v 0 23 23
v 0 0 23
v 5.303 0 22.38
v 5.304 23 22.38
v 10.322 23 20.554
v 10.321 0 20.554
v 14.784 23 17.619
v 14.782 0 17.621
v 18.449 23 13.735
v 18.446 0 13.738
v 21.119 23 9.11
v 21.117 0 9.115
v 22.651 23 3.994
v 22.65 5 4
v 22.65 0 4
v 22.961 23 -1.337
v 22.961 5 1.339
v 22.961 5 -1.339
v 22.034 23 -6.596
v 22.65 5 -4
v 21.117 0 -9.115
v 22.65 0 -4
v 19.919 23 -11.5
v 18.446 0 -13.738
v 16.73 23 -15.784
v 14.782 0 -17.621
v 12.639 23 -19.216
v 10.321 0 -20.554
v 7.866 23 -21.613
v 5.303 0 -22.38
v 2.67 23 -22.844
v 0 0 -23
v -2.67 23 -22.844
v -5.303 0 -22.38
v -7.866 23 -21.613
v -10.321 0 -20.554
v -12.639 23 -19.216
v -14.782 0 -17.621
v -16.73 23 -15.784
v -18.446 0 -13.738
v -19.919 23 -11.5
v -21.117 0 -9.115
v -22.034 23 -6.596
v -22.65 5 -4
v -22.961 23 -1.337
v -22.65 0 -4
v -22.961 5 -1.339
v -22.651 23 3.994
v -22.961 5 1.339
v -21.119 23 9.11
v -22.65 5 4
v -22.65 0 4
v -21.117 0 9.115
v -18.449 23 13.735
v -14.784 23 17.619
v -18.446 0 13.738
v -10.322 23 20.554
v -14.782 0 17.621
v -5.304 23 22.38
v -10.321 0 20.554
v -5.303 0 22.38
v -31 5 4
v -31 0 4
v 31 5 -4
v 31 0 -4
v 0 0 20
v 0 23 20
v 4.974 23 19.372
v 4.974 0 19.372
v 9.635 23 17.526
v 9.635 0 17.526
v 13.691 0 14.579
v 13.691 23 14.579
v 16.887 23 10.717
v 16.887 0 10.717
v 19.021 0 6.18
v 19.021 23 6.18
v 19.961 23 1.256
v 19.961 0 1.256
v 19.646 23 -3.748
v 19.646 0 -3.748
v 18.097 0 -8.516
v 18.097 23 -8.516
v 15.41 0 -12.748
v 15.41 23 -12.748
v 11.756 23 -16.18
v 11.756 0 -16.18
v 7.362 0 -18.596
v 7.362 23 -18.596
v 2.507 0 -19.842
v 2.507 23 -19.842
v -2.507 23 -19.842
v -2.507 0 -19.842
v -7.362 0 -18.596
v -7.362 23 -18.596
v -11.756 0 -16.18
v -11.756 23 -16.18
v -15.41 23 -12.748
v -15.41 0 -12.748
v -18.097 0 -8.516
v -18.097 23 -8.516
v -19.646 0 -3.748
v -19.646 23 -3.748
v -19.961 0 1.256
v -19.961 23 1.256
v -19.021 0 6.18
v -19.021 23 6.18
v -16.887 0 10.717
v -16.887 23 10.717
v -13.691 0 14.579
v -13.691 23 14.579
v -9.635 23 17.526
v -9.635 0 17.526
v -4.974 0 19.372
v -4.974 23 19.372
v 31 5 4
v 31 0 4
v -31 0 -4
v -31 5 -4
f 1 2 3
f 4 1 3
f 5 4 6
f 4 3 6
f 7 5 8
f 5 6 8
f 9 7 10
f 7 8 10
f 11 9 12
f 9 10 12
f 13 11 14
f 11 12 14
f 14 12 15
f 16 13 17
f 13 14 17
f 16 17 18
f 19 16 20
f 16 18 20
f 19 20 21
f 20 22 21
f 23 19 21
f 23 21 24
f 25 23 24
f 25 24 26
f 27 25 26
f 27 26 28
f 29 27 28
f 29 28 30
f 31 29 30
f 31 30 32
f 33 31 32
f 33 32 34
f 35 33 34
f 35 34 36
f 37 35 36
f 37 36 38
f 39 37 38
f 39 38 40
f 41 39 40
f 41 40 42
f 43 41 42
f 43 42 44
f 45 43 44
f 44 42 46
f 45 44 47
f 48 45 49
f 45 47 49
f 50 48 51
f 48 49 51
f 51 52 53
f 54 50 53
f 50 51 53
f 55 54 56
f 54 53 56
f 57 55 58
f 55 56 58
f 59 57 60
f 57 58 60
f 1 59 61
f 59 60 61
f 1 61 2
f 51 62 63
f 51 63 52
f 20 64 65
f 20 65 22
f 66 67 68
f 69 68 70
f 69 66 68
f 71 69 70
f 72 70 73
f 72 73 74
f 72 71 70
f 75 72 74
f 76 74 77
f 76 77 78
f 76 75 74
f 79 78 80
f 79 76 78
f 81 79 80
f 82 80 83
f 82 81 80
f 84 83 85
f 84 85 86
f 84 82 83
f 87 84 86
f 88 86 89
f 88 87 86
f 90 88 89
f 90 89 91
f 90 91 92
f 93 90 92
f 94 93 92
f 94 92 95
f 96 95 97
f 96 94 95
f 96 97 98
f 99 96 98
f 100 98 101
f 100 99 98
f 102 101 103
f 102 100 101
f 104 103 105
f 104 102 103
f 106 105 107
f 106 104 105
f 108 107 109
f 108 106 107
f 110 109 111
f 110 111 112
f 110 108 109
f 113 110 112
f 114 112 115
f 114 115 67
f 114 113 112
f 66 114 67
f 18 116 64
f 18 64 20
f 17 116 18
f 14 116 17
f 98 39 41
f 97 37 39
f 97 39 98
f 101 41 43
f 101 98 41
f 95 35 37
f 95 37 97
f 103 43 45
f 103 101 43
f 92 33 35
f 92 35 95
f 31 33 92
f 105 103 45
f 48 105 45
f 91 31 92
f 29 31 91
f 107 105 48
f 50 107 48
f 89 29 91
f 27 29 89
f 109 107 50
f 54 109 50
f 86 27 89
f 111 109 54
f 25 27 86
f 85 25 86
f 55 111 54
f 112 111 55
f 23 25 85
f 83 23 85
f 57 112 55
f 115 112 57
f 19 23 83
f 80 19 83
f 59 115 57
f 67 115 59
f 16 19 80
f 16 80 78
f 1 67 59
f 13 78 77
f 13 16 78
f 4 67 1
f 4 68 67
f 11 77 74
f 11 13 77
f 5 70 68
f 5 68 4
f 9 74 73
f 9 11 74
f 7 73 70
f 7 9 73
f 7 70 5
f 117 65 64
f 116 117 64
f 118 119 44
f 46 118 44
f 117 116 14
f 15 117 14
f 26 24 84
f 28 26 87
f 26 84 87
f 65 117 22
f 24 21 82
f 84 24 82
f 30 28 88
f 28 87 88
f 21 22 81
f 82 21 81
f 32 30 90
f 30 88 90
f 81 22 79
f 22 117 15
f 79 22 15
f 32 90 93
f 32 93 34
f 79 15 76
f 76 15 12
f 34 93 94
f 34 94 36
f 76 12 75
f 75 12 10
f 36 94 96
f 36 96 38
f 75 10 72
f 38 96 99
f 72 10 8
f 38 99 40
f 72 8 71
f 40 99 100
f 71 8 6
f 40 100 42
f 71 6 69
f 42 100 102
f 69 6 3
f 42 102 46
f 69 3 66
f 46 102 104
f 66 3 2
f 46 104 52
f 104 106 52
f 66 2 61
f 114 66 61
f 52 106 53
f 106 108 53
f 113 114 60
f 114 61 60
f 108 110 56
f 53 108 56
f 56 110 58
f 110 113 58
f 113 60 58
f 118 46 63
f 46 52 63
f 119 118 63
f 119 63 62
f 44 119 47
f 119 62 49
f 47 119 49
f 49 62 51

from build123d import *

# Parameters (mm, degrees)
SKETCH_1_R      = 23
SKETCH_1_R_2    = 20
EXTRUDE_1_DEPTH = 23
SKETCH_3_W      = 9
SKETCH_3_H      = 5
EXTRUDE_2_DEPTH = 4


with BuildPart() as part:
    # 草图1 → 凸台-拉伸1 (new body)
    with BuildSketch(Plane(origin=(0, 0, 0), x_dir=(1, 0, 0), z_dir=(0, 1, 0))):
        with Locations(Location((0, 0, 0), (0, 0, 270))):
            Circle(SKETCH_1_R)
        with Locations(Location((0, 0, 0), (0, 0, 270))):
            Circle(SKETCH_1_R_2, mode=Mode.SUBTRACT)
    extrude(amount=EXTRUDE_1_DEPTH)

    # 草图3 → 凸台-拉伸2 (add, symmetric)
    with BuildSketch(Plane.XY):
        with Locations((-26.5, 2.5)):
            Rectangle(SKETCH_3_W, SKETCH_3_H)
    extrude_2 = extrude(amount=EXTRUDE_2_DEPTH, both=True)

    # 镜向1: 凸台-拉伸2 across plane
    add(extrude_2.mirror(Plane(origin=(0, 0, 0), x_dir=(0, 0, 1), z_dir=(1, 0, 0))))


solid = part.part
